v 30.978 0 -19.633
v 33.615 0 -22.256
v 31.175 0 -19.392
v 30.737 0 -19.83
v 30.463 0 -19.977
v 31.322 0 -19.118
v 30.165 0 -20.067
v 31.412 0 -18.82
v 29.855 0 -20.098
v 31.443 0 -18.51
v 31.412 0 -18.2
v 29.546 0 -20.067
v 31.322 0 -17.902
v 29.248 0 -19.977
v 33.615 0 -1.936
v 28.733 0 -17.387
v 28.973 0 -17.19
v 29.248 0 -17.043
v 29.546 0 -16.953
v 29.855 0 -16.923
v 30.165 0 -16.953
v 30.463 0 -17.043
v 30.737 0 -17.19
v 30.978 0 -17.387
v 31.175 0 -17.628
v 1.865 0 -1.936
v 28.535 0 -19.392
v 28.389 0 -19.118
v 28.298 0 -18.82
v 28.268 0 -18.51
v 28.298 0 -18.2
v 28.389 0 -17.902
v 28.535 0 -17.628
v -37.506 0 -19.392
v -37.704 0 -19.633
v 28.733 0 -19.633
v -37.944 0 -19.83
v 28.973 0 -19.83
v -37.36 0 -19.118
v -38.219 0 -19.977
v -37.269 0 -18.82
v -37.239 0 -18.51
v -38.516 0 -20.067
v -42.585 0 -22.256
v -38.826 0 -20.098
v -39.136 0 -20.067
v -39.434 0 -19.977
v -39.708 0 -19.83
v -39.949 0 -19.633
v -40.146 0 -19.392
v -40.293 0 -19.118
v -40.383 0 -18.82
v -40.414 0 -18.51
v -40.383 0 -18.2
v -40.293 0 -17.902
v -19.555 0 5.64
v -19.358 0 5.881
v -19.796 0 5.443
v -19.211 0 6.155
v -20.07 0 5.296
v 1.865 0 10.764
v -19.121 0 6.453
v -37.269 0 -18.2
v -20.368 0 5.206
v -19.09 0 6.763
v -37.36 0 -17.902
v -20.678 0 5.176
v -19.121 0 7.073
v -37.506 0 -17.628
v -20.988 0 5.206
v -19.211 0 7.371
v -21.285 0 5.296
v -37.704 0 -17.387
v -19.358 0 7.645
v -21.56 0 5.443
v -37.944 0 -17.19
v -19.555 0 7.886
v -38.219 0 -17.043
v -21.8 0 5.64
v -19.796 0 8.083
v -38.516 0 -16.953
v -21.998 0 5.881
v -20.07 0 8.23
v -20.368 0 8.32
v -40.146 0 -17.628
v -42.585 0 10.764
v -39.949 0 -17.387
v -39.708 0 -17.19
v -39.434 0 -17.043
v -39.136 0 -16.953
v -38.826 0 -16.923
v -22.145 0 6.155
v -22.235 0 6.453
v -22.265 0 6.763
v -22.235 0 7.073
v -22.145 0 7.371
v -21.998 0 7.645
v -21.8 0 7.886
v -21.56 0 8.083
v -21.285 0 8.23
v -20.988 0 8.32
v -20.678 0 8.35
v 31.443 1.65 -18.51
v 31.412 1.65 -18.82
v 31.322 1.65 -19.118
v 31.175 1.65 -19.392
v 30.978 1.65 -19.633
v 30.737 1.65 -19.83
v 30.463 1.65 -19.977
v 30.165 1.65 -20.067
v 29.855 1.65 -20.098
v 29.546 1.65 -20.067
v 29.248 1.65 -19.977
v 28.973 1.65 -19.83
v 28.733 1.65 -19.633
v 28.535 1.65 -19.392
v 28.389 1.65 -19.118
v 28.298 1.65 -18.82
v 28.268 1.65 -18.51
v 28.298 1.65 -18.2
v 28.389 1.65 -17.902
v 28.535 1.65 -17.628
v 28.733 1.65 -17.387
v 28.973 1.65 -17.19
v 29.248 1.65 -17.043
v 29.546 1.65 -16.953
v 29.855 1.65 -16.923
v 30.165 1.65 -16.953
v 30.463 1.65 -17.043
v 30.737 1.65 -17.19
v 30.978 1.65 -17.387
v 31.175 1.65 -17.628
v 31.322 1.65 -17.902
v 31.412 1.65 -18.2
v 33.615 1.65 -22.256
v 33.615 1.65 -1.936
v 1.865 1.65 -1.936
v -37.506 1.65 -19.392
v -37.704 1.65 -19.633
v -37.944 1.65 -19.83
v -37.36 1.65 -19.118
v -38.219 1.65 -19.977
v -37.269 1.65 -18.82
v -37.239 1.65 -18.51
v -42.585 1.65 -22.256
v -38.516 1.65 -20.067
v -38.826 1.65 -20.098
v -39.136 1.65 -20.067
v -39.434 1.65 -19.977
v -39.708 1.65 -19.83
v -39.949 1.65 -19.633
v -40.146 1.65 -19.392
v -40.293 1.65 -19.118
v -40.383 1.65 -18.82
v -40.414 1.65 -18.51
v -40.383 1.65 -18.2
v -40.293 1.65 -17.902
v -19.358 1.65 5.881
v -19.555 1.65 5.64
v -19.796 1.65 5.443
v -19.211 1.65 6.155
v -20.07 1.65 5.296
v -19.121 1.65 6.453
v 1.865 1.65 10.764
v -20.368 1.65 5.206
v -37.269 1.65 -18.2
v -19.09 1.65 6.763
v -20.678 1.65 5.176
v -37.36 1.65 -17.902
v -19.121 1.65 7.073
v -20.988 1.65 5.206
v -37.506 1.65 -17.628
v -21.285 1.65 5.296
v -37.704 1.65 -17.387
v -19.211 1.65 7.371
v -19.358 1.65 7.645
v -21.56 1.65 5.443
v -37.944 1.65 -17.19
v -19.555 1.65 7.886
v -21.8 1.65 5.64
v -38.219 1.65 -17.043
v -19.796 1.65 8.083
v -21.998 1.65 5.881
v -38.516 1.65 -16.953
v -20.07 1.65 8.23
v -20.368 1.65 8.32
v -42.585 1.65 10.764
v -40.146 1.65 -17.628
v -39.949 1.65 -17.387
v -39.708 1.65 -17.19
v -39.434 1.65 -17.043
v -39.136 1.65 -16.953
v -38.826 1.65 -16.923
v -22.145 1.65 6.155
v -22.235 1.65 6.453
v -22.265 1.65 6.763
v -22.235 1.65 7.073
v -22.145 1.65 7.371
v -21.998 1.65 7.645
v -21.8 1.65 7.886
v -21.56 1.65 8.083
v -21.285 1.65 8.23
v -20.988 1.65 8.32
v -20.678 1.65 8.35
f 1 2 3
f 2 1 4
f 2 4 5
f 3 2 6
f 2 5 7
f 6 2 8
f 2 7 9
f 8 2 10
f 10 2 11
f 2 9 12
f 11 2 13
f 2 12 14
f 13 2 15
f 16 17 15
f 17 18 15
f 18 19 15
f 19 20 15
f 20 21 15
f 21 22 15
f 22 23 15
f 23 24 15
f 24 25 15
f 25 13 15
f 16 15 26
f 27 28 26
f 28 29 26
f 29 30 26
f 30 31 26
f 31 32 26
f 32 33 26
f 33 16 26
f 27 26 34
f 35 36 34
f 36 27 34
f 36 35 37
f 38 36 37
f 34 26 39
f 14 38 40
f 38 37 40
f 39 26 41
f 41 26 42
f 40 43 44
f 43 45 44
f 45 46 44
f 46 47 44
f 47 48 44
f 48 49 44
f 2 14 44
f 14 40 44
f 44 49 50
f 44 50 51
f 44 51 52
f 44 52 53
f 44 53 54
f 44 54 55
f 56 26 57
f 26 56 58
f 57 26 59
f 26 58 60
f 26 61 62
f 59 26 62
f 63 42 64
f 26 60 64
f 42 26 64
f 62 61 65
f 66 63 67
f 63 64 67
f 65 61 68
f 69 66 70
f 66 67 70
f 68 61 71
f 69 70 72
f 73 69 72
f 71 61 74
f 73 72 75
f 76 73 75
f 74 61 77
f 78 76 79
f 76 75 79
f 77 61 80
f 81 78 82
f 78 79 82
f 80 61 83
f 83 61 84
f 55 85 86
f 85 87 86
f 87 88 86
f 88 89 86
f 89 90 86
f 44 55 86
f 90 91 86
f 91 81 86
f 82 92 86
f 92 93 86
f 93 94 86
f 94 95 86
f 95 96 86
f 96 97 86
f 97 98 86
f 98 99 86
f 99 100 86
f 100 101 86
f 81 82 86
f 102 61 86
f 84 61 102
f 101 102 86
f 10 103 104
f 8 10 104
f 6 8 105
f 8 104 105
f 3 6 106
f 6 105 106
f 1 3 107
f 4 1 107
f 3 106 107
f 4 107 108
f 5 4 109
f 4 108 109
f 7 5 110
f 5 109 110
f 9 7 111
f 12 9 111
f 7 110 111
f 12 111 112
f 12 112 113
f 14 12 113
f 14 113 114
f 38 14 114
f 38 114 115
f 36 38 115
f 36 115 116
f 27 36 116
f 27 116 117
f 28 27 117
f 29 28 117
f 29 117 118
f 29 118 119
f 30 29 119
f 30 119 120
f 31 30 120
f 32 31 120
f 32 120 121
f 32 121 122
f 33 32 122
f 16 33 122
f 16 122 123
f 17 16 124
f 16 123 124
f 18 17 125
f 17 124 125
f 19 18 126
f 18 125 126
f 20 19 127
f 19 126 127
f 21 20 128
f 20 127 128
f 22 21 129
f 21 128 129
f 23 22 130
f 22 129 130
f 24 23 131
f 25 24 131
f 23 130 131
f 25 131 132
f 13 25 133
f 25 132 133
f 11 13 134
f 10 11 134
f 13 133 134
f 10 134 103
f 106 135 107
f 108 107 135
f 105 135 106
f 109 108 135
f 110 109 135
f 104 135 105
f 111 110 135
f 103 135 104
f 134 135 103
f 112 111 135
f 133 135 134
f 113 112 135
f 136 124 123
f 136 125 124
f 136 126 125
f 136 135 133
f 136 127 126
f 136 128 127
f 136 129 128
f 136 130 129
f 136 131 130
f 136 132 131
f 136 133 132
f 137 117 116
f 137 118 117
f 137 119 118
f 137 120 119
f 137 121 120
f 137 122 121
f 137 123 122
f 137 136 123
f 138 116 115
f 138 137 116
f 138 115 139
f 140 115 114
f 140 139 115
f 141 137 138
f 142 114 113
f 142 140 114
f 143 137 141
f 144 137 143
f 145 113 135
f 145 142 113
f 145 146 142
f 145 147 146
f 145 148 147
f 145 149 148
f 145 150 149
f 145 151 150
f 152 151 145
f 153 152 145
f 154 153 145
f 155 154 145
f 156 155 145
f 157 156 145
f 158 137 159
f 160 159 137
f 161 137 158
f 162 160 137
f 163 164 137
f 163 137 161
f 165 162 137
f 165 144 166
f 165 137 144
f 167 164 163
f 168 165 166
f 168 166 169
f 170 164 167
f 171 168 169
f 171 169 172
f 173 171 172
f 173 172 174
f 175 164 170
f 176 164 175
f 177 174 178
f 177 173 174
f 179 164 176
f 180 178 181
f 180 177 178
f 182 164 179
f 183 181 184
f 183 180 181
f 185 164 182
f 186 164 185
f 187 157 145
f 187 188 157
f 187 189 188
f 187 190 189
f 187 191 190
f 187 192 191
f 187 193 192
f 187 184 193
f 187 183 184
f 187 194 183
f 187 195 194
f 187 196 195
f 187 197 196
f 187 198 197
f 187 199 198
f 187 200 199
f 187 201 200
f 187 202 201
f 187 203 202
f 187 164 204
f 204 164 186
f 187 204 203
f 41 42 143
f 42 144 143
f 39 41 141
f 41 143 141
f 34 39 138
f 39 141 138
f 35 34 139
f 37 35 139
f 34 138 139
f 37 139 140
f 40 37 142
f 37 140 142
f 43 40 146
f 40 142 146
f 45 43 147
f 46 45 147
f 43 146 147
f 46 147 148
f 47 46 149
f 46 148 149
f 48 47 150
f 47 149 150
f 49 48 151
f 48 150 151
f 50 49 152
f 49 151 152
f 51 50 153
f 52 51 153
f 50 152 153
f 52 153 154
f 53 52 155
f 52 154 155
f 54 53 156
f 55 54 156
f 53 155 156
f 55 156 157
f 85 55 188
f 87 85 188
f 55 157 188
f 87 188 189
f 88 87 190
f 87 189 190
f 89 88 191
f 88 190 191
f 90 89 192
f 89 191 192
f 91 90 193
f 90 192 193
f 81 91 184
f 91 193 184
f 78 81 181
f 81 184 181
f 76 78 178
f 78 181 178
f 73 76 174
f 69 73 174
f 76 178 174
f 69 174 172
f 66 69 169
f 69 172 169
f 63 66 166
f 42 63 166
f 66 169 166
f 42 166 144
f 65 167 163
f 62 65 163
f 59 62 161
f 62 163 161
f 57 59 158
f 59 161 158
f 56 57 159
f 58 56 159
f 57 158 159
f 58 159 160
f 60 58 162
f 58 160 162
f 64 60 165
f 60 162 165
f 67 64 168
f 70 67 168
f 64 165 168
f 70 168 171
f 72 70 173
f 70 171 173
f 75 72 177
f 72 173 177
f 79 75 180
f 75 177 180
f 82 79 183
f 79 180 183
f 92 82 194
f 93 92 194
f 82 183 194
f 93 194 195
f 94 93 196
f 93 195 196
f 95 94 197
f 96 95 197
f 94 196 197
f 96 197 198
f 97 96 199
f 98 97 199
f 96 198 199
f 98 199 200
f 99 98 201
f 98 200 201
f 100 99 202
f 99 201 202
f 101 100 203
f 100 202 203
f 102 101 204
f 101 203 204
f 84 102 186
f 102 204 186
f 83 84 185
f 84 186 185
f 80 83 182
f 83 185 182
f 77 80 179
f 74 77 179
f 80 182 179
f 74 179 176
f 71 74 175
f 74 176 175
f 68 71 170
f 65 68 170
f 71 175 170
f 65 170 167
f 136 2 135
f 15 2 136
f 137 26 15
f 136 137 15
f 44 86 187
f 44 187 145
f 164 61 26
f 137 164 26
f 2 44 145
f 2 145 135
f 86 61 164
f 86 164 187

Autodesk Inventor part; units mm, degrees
ref_plane "YZ Plane" through (0, 0, 0) normal (1, 0, 0) x (0, 1, 0)
ref_plane "XZ Plane" through (0, 0, 0) normal (0, 1, 0) x (-1, 0, 0)
ref_plane "XY Plane" through (0, 0, 0) normal (0, 0, 1) x (1, 0, 0)
sketch "Sketch1" plane through (0, 0, 0) normal (0, 1, 0) x (-1, 0, 0)
  line L0 (-33.6146, 10.7635) -> (42.5854, 10.7635)
  line L1 (42.5854, 10.7635) -> (42.5854, -22.2565)
  line L2 (42.5854, -22.2565) -> (-33.6146, -22.2565)
  line L3 (-33.6146, -22.2565) -> (-33.6146, 10.7635)
  line L4 (-33.6146, -22.2565) -> (-10.7151, -22.2565)
  line L5 (-33.6146, -8.8905) -> (-33.6146, -22.2565)
  line L6 (-33.6146, 10.7635) -> (-1.8646, 10.7635)
  line L7 (-1.8646, 10.7635) -> (-1.8646, -1.9365)
  line L8 (-1.8646, -1.9365) -> (-33.6146, -1.9365)
  line L9 (-33.6146, -1.9365) -> (-33.6146, 10.7635)
  point P0 (0, 0)
  dimension "d0" = 76.2
  dimension "d1" = 33.02
  dimension "d37" = 12.7
  dimension "d50" = 31.75
extrude "Extrusion1" add sketch "Sketch1" along normal blind 1.65 contours L0 L1 L2 L3 L8 L7
sketch "Sketch6" plane through (0, 1.65, 0) normal (0, 1, 0) x (1, 0, 0)
  line L0 (33.6146, 1.9365) -> (33.6146, 22.2565) projected
  line L1 (33.6146, 22.2565) -> (-42.5854, 22.2565) projected
  line L2 (-42.5854, 22.2565) -> (-42.5854, -10.7635) projected
  line L3 (-42.5854, -10.7635) -> (1.8646, -10.7635) projected
  circle A0 centre (-38.8262, 18.51) radius 1.5875
  circle A1 centre (29.8554, 18.51) radius 1.5875
  circle A2 centre (-20.6779, -6.763) radius 1.5875
  point P0 (0, 0)
  dimension "d39" = 3.175
  dimension "d40" = 3.175
  dimension "d41" = 3.175
  dimension "d42" = 21.9075
  dimension "d43" = 4.0005
  dimension "d44" = 3.7465
  dimension "d45" = 3.7465
  dimension "d46" = 3.7592
  dimension "d47" = 3.7592
extrude "Extrusion6" cut sketch "Sketch6" against normal blind 7.53
properties part number "InjectorBoard"
